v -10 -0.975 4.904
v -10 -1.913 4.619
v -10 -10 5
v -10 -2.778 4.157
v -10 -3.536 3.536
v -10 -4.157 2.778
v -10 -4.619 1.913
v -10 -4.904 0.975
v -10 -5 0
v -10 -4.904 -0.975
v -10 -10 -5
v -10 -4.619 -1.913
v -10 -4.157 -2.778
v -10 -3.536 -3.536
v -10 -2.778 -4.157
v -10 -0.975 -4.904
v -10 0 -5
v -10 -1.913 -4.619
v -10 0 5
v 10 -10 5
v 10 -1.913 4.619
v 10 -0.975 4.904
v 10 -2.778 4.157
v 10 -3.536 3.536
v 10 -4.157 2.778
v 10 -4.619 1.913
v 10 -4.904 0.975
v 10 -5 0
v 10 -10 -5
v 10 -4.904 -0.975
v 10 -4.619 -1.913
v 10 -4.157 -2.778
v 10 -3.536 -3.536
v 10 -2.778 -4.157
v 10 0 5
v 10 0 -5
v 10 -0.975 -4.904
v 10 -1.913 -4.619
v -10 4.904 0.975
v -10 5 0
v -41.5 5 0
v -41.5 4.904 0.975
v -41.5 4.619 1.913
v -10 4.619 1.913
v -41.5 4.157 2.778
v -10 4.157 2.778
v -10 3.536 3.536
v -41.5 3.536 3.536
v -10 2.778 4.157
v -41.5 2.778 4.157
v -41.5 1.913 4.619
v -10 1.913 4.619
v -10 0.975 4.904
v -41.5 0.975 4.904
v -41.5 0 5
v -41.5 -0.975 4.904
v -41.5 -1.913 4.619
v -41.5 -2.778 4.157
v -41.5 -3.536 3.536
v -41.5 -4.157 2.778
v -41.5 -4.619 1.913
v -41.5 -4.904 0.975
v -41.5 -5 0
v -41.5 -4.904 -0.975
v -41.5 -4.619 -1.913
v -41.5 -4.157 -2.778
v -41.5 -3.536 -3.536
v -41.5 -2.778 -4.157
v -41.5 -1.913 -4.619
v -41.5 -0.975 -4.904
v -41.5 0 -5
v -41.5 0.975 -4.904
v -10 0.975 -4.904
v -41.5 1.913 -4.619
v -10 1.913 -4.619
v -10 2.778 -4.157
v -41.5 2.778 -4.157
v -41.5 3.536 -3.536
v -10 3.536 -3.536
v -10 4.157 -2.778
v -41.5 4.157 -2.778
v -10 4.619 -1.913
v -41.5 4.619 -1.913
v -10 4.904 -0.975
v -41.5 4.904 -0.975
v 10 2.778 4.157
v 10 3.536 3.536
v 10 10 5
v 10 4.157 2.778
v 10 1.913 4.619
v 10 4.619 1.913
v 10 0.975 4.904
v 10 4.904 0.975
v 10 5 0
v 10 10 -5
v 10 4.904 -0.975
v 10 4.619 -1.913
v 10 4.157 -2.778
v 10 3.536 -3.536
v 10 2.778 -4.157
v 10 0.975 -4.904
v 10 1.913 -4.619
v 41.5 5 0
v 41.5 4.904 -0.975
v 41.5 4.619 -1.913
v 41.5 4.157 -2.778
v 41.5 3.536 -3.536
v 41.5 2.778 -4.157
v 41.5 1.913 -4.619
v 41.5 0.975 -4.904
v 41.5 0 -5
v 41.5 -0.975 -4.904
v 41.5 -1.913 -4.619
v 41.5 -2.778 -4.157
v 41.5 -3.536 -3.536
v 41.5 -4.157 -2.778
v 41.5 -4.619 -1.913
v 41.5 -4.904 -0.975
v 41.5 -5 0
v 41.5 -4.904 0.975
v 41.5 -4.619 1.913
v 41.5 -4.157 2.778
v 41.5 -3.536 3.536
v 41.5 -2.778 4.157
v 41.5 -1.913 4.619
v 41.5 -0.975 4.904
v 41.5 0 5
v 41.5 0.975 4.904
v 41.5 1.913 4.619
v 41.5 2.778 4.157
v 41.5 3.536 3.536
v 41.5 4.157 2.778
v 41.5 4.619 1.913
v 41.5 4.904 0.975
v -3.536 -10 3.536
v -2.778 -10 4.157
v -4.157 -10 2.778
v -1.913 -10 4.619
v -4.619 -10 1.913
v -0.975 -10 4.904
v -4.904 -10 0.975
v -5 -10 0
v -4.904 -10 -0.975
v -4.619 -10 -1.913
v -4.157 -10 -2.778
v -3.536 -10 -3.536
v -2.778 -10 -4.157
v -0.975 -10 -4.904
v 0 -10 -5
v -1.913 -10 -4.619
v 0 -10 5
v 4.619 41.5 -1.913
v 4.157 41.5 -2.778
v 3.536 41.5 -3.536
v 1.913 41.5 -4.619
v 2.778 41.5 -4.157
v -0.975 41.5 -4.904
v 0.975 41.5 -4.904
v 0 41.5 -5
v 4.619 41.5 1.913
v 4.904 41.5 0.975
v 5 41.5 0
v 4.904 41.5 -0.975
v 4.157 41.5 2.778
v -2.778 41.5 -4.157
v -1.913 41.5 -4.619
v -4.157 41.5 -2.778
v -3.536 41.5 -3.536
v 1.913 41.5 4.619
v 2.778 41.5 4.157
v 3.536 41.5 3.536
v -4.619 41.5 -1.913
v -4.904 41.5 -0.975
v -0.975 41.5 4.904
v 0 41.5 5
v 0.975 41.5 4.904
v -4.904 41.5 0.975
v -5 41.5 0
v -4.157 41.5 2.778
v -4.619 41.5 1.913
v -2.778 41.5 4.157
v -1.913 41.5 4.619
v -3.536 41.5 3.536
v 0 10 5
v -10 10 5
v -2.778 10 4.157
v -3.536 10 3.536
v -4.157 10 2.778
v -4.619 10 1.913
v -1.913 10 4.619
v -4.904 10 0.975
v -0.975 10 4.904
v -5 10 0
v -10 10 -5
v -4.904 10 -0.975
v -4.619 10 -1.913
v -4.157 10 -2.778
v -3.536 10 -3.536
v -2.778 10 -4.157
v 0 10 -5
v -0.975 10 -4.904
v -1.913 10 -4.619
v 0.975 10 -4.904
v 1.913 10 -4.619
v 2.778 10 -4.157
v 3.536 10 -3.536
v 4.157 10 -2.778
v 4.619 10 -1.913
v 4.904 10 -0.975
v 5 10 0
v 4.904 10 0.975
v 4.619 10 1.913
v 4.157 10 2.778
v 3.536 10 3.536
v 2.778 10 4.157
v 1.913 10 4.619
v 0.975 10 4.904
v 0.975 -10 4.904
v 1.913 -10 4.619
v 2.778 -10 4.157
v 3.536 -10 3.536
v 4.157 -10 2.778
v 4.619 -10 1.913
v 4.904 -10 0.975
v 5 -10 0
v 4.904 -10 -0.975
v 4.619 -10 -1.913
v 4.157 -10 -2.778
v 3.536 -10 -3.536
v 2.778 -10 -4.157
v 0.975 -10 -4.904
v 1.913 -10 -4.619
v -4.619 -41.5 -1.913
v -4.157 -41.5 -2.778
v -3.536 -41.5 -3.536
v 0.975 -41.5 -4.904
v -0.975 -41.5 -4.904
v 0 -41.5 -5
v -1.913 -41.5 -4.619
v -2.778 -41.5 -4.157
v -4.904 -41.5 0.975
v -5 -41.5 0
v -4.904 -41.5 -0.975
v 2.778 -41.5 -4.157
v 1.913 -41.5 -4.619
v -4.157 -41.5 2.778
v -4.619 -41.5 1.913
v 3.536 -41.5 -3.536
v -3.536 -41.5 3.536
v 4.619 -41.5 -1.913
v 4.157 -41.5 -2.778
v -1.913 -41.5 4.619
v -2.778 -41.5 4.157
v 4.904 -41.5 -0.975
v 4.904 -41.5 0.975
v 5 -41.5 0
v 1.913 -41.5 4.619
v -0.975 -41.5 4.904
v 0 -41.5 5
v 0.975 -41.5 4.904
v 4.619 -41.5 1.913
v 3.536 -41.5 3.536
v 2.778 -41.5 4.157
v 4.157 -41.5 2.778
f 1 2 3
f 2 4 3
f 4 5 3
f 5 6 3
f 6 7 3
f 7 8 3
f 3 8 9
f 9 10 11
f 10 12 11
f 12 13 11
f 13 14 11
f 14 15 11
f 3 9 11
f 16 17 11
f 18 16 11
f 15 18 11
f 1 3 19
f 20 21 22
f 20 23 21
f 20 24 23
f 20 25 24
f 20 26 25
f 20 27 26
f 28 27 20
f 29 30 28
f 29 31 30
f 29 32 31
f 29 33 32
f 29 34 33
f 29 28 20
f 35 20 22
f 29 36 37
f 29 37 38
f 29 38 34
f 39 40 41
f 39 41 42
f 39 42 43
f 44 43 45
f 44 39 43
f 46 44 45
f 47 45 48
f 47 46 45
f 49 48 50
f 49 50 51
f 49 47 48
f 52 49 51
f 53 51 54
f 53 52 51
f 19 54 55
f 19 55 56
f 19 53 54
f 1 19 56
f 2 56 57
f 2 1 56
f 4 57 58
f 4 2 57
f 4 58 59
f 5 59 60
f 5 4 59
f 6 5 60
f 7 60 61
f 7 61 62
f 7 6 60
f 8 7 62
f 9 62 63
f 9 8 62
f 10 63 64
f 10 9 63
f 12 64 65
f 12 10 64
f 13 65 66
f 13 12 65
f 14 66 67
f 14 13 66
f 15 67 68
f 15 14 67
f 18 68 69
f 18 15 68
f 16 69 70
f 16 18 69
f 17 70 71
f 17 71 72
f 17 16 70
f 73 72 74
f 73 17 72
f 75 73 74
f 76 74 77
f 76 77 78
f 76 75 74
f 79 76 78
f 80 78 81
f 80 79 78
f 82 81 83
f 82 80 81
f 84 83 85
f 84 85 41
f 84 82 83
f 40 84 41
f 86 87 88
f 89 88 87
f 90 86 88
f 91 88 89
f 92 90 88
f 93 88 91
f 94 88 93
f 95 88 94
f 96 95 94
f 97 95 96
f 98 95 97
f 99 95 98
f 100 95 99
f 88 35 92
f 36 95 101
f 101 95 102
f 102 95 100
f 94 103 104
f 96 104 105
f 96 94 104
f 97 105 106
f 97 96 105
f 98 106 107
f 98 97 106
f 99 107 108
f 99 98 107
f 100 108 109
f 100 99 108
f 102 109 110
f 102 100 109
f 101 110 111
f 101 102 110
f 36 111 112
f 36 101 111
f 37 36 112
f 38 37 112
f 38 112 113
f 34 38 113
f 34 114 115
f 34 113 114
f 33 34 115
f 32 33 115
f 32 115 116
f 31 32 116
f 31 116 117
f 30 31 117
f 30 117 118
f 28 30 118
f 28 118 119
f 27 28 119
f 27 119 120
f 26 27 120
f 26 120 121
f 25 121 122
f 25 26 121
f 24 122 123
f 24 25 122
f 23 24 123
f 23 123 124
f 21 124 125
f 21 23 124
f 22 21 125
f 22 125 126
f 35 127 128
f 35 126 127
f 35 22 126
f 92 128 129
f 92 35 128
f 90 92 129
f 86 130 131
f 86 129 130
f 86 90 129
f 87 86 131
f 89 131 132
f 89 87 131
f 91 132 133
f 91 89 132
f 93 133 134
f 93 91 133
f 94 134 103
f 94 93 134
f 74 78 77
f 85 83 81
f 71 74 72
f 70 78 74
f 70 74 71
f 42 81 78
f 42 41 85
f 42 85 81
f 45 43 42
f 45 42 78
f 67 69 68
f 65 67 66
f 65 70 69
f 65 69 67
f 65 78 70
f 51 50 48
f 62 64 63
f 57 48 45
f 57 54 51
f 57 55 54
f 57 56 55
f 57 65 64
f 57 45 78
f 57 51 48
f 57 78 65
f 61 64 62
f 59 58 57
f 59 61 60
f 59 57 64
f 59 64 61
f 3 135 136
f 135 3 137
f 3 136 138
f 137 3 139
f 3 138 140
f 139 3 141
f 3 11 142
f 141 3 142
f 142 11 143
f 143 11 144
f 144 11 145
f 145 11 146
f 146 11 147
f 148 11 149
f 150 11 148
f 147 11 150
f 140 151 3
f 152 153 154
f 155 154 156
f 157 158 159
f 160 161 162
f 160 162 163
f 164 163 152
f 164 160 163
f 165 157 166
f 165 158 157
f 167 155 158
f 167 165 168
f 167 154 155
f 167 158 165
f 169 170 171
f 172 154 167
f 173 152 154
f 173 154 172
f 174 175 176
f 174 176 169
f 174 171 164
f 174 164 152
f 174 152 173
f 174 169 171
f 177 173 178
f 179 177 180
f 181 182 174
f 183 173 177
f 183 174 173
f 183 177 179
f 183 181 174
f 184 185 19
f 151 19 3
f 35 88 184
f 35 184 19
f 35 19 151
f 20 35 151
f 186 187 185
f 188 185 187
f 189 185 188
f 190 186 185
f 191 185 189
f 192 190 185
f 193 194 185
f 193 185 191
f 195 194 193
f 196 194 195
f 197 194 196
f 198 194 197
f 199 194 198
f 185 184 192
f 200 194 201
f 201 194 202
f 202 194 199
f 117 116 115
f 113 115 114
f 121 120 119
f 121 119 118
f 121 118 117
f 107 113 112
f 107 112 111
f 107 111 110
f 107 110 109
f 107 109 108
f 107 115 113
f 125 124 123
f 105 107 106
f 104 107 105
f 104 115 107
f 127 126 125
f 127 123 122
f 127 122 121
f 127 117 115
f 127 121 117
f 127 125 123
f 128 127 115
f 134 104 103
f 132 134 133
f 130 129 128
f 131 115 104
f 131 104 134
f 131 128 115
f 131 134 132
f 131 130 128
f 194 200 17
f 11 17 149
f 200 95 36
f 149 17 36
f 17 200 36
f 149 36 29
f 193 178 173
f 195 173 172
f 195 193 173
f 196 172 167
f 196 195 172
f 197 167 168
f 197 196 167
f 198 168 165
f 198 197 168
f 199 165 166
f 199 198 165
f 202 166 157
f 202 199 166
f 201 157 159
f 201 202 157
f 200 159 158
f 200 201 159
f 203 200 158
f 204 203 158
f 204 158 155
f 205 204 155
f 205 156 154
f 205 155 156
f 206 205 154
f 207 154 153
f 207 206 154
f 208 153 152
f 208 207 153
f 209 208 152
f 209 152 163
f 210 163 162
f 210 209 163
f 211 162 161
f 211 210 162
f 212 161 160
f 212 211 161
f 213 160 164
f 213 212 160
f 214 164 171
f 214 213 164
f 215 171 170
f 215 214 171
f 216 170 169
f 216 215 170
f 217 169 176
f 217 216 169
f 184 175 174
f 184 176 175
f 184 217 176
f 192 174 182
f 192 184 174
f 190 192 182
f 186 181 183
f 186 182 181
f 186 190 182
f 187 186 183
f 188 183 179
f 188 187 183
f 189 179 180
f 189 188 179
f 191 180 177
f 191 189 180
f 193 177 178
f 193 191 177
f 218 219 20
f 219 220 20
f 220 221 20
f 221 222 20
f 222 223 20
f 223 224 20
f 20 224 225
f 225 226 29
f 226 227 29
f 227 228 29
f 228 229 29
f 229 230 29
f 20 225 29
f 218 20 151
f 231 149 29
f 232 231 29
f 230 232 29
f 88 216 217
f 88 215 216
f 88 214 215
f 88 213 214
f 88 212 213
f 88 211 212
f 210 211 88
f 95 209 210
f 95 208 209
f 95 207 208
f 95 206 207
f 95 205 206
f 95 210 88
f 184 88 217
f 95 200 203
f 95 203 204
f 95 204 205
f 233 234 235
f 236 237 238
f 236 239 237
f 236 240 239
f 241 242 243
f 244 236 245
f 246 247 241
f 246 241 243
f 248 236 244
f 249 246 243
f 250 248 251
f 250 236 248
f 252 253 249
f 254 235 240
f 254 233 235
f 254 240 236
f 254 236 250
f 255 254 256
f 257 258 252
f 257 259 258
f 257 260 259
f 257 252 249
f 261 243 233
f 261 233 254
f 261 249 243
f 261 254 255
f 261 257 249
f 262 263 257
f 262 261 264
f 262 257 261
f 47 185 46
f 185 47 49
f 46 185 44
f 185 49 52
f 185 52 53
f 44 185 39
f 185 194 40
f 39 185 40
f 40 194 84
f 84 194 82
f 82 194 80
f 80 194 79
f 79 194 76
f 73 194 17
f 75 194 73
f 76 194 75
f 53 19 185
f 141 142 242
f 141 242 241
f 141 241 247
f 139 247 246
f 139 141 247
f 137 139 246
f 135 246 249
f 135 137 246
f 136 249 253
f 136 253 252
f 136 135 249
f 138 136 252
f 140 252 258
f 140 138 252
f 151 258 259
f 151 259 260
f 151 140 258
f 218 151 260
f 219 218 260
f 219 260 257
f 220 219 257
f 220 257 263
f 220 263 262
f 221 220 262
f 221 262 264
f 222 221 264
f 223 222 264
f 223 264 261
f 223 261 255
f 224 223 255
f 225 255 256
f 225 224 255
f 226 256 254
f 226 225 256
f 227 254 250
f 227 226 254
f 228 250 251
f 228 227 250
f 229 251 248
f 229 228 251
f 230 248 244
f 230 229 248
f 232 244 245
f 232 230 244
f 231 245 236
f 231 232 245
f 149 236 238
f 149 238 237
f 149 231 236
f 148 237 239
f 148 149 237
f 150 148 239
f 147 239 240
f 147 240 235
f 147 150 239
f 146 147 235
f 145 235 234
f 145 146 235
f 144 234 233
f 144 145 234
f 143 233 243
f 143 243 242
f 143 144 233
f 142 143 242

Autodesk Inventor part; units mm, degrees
ref_plane "YZ Plane" through (0, 0, 0) normal (1, 0, 0) x (0, 1, 0)
ref_plane "XZ Plane" through (0, 0, 0) normal (0, 1, 0) x (-1, 0, 0)
ref_plane "XY Plane" through (0, 0, 0) normal (0, 0, 1) x (1, 0, 0)
sketch "Sketch1" plane through (0, 0, 0) normal (0, 1, 0) x (-1, 0, 0)
  line L0 (0, 0) -> (-10, 0) construction
  line L1 (-10, 0) -> (-10, -10)
  line L2 (-10, -10) -> (0, -10)
  line L3 (0, -10) -> (0, 0) construction
  line L4 (-10, 0) -> (-10, 10)
  line L5 (-10, 10) -> (0, 10)
  line L6 (10, 0) -> (10, -10)
  line L7 (10, -10) -> (0, -10)
  line L8 (10, 10) -> (0, 10)
  line L9 (10, 0) -> (10, 10)
  dimension "d0" = 10
extrude "Extrusion1" add sketch "Sketch1" along normal mid plane 10
sketch "Sketch2" plane through (-10, 5, 10) normal (0, 0, 1) x (1, 0, 0)
  circle A0 centre (10, -5) radius 5
  dimension "d4" = 10
extrude "Extrusion2" add sketch "Sketch2" along normal blind 31.5
mirror "Mirror1" about plane through (0, 0, 0) normal (0, 0, 1) of "Extrusion2"
sketch "Sketch3" plane through (10, -5, -10) normal (1, 0, 0) x (0, 0, -1)
  circle A0 centre (-10, 5) radius 5
  dimension "d8" = 10
extrude "Extrusion3" add sketch "Sketch3" along normal blind 31.5
mirror "Mirror2" about plane through (0, 0, 0) normal (1, 0, 0) of "Extrusion3"
move or copy body "Move Body1" bodies to move or copy 1 copy no rotation origin (0, 0, 0) rotation axis (1, 0, 0) rotation angle 90
move or copy body "Move Body2" bodies to move or copy 1 copy no rotation origin (0, 0, 0) rotation axis (0, 0, 1) rotation angle 90
properties part number "HipRoll_v2"
